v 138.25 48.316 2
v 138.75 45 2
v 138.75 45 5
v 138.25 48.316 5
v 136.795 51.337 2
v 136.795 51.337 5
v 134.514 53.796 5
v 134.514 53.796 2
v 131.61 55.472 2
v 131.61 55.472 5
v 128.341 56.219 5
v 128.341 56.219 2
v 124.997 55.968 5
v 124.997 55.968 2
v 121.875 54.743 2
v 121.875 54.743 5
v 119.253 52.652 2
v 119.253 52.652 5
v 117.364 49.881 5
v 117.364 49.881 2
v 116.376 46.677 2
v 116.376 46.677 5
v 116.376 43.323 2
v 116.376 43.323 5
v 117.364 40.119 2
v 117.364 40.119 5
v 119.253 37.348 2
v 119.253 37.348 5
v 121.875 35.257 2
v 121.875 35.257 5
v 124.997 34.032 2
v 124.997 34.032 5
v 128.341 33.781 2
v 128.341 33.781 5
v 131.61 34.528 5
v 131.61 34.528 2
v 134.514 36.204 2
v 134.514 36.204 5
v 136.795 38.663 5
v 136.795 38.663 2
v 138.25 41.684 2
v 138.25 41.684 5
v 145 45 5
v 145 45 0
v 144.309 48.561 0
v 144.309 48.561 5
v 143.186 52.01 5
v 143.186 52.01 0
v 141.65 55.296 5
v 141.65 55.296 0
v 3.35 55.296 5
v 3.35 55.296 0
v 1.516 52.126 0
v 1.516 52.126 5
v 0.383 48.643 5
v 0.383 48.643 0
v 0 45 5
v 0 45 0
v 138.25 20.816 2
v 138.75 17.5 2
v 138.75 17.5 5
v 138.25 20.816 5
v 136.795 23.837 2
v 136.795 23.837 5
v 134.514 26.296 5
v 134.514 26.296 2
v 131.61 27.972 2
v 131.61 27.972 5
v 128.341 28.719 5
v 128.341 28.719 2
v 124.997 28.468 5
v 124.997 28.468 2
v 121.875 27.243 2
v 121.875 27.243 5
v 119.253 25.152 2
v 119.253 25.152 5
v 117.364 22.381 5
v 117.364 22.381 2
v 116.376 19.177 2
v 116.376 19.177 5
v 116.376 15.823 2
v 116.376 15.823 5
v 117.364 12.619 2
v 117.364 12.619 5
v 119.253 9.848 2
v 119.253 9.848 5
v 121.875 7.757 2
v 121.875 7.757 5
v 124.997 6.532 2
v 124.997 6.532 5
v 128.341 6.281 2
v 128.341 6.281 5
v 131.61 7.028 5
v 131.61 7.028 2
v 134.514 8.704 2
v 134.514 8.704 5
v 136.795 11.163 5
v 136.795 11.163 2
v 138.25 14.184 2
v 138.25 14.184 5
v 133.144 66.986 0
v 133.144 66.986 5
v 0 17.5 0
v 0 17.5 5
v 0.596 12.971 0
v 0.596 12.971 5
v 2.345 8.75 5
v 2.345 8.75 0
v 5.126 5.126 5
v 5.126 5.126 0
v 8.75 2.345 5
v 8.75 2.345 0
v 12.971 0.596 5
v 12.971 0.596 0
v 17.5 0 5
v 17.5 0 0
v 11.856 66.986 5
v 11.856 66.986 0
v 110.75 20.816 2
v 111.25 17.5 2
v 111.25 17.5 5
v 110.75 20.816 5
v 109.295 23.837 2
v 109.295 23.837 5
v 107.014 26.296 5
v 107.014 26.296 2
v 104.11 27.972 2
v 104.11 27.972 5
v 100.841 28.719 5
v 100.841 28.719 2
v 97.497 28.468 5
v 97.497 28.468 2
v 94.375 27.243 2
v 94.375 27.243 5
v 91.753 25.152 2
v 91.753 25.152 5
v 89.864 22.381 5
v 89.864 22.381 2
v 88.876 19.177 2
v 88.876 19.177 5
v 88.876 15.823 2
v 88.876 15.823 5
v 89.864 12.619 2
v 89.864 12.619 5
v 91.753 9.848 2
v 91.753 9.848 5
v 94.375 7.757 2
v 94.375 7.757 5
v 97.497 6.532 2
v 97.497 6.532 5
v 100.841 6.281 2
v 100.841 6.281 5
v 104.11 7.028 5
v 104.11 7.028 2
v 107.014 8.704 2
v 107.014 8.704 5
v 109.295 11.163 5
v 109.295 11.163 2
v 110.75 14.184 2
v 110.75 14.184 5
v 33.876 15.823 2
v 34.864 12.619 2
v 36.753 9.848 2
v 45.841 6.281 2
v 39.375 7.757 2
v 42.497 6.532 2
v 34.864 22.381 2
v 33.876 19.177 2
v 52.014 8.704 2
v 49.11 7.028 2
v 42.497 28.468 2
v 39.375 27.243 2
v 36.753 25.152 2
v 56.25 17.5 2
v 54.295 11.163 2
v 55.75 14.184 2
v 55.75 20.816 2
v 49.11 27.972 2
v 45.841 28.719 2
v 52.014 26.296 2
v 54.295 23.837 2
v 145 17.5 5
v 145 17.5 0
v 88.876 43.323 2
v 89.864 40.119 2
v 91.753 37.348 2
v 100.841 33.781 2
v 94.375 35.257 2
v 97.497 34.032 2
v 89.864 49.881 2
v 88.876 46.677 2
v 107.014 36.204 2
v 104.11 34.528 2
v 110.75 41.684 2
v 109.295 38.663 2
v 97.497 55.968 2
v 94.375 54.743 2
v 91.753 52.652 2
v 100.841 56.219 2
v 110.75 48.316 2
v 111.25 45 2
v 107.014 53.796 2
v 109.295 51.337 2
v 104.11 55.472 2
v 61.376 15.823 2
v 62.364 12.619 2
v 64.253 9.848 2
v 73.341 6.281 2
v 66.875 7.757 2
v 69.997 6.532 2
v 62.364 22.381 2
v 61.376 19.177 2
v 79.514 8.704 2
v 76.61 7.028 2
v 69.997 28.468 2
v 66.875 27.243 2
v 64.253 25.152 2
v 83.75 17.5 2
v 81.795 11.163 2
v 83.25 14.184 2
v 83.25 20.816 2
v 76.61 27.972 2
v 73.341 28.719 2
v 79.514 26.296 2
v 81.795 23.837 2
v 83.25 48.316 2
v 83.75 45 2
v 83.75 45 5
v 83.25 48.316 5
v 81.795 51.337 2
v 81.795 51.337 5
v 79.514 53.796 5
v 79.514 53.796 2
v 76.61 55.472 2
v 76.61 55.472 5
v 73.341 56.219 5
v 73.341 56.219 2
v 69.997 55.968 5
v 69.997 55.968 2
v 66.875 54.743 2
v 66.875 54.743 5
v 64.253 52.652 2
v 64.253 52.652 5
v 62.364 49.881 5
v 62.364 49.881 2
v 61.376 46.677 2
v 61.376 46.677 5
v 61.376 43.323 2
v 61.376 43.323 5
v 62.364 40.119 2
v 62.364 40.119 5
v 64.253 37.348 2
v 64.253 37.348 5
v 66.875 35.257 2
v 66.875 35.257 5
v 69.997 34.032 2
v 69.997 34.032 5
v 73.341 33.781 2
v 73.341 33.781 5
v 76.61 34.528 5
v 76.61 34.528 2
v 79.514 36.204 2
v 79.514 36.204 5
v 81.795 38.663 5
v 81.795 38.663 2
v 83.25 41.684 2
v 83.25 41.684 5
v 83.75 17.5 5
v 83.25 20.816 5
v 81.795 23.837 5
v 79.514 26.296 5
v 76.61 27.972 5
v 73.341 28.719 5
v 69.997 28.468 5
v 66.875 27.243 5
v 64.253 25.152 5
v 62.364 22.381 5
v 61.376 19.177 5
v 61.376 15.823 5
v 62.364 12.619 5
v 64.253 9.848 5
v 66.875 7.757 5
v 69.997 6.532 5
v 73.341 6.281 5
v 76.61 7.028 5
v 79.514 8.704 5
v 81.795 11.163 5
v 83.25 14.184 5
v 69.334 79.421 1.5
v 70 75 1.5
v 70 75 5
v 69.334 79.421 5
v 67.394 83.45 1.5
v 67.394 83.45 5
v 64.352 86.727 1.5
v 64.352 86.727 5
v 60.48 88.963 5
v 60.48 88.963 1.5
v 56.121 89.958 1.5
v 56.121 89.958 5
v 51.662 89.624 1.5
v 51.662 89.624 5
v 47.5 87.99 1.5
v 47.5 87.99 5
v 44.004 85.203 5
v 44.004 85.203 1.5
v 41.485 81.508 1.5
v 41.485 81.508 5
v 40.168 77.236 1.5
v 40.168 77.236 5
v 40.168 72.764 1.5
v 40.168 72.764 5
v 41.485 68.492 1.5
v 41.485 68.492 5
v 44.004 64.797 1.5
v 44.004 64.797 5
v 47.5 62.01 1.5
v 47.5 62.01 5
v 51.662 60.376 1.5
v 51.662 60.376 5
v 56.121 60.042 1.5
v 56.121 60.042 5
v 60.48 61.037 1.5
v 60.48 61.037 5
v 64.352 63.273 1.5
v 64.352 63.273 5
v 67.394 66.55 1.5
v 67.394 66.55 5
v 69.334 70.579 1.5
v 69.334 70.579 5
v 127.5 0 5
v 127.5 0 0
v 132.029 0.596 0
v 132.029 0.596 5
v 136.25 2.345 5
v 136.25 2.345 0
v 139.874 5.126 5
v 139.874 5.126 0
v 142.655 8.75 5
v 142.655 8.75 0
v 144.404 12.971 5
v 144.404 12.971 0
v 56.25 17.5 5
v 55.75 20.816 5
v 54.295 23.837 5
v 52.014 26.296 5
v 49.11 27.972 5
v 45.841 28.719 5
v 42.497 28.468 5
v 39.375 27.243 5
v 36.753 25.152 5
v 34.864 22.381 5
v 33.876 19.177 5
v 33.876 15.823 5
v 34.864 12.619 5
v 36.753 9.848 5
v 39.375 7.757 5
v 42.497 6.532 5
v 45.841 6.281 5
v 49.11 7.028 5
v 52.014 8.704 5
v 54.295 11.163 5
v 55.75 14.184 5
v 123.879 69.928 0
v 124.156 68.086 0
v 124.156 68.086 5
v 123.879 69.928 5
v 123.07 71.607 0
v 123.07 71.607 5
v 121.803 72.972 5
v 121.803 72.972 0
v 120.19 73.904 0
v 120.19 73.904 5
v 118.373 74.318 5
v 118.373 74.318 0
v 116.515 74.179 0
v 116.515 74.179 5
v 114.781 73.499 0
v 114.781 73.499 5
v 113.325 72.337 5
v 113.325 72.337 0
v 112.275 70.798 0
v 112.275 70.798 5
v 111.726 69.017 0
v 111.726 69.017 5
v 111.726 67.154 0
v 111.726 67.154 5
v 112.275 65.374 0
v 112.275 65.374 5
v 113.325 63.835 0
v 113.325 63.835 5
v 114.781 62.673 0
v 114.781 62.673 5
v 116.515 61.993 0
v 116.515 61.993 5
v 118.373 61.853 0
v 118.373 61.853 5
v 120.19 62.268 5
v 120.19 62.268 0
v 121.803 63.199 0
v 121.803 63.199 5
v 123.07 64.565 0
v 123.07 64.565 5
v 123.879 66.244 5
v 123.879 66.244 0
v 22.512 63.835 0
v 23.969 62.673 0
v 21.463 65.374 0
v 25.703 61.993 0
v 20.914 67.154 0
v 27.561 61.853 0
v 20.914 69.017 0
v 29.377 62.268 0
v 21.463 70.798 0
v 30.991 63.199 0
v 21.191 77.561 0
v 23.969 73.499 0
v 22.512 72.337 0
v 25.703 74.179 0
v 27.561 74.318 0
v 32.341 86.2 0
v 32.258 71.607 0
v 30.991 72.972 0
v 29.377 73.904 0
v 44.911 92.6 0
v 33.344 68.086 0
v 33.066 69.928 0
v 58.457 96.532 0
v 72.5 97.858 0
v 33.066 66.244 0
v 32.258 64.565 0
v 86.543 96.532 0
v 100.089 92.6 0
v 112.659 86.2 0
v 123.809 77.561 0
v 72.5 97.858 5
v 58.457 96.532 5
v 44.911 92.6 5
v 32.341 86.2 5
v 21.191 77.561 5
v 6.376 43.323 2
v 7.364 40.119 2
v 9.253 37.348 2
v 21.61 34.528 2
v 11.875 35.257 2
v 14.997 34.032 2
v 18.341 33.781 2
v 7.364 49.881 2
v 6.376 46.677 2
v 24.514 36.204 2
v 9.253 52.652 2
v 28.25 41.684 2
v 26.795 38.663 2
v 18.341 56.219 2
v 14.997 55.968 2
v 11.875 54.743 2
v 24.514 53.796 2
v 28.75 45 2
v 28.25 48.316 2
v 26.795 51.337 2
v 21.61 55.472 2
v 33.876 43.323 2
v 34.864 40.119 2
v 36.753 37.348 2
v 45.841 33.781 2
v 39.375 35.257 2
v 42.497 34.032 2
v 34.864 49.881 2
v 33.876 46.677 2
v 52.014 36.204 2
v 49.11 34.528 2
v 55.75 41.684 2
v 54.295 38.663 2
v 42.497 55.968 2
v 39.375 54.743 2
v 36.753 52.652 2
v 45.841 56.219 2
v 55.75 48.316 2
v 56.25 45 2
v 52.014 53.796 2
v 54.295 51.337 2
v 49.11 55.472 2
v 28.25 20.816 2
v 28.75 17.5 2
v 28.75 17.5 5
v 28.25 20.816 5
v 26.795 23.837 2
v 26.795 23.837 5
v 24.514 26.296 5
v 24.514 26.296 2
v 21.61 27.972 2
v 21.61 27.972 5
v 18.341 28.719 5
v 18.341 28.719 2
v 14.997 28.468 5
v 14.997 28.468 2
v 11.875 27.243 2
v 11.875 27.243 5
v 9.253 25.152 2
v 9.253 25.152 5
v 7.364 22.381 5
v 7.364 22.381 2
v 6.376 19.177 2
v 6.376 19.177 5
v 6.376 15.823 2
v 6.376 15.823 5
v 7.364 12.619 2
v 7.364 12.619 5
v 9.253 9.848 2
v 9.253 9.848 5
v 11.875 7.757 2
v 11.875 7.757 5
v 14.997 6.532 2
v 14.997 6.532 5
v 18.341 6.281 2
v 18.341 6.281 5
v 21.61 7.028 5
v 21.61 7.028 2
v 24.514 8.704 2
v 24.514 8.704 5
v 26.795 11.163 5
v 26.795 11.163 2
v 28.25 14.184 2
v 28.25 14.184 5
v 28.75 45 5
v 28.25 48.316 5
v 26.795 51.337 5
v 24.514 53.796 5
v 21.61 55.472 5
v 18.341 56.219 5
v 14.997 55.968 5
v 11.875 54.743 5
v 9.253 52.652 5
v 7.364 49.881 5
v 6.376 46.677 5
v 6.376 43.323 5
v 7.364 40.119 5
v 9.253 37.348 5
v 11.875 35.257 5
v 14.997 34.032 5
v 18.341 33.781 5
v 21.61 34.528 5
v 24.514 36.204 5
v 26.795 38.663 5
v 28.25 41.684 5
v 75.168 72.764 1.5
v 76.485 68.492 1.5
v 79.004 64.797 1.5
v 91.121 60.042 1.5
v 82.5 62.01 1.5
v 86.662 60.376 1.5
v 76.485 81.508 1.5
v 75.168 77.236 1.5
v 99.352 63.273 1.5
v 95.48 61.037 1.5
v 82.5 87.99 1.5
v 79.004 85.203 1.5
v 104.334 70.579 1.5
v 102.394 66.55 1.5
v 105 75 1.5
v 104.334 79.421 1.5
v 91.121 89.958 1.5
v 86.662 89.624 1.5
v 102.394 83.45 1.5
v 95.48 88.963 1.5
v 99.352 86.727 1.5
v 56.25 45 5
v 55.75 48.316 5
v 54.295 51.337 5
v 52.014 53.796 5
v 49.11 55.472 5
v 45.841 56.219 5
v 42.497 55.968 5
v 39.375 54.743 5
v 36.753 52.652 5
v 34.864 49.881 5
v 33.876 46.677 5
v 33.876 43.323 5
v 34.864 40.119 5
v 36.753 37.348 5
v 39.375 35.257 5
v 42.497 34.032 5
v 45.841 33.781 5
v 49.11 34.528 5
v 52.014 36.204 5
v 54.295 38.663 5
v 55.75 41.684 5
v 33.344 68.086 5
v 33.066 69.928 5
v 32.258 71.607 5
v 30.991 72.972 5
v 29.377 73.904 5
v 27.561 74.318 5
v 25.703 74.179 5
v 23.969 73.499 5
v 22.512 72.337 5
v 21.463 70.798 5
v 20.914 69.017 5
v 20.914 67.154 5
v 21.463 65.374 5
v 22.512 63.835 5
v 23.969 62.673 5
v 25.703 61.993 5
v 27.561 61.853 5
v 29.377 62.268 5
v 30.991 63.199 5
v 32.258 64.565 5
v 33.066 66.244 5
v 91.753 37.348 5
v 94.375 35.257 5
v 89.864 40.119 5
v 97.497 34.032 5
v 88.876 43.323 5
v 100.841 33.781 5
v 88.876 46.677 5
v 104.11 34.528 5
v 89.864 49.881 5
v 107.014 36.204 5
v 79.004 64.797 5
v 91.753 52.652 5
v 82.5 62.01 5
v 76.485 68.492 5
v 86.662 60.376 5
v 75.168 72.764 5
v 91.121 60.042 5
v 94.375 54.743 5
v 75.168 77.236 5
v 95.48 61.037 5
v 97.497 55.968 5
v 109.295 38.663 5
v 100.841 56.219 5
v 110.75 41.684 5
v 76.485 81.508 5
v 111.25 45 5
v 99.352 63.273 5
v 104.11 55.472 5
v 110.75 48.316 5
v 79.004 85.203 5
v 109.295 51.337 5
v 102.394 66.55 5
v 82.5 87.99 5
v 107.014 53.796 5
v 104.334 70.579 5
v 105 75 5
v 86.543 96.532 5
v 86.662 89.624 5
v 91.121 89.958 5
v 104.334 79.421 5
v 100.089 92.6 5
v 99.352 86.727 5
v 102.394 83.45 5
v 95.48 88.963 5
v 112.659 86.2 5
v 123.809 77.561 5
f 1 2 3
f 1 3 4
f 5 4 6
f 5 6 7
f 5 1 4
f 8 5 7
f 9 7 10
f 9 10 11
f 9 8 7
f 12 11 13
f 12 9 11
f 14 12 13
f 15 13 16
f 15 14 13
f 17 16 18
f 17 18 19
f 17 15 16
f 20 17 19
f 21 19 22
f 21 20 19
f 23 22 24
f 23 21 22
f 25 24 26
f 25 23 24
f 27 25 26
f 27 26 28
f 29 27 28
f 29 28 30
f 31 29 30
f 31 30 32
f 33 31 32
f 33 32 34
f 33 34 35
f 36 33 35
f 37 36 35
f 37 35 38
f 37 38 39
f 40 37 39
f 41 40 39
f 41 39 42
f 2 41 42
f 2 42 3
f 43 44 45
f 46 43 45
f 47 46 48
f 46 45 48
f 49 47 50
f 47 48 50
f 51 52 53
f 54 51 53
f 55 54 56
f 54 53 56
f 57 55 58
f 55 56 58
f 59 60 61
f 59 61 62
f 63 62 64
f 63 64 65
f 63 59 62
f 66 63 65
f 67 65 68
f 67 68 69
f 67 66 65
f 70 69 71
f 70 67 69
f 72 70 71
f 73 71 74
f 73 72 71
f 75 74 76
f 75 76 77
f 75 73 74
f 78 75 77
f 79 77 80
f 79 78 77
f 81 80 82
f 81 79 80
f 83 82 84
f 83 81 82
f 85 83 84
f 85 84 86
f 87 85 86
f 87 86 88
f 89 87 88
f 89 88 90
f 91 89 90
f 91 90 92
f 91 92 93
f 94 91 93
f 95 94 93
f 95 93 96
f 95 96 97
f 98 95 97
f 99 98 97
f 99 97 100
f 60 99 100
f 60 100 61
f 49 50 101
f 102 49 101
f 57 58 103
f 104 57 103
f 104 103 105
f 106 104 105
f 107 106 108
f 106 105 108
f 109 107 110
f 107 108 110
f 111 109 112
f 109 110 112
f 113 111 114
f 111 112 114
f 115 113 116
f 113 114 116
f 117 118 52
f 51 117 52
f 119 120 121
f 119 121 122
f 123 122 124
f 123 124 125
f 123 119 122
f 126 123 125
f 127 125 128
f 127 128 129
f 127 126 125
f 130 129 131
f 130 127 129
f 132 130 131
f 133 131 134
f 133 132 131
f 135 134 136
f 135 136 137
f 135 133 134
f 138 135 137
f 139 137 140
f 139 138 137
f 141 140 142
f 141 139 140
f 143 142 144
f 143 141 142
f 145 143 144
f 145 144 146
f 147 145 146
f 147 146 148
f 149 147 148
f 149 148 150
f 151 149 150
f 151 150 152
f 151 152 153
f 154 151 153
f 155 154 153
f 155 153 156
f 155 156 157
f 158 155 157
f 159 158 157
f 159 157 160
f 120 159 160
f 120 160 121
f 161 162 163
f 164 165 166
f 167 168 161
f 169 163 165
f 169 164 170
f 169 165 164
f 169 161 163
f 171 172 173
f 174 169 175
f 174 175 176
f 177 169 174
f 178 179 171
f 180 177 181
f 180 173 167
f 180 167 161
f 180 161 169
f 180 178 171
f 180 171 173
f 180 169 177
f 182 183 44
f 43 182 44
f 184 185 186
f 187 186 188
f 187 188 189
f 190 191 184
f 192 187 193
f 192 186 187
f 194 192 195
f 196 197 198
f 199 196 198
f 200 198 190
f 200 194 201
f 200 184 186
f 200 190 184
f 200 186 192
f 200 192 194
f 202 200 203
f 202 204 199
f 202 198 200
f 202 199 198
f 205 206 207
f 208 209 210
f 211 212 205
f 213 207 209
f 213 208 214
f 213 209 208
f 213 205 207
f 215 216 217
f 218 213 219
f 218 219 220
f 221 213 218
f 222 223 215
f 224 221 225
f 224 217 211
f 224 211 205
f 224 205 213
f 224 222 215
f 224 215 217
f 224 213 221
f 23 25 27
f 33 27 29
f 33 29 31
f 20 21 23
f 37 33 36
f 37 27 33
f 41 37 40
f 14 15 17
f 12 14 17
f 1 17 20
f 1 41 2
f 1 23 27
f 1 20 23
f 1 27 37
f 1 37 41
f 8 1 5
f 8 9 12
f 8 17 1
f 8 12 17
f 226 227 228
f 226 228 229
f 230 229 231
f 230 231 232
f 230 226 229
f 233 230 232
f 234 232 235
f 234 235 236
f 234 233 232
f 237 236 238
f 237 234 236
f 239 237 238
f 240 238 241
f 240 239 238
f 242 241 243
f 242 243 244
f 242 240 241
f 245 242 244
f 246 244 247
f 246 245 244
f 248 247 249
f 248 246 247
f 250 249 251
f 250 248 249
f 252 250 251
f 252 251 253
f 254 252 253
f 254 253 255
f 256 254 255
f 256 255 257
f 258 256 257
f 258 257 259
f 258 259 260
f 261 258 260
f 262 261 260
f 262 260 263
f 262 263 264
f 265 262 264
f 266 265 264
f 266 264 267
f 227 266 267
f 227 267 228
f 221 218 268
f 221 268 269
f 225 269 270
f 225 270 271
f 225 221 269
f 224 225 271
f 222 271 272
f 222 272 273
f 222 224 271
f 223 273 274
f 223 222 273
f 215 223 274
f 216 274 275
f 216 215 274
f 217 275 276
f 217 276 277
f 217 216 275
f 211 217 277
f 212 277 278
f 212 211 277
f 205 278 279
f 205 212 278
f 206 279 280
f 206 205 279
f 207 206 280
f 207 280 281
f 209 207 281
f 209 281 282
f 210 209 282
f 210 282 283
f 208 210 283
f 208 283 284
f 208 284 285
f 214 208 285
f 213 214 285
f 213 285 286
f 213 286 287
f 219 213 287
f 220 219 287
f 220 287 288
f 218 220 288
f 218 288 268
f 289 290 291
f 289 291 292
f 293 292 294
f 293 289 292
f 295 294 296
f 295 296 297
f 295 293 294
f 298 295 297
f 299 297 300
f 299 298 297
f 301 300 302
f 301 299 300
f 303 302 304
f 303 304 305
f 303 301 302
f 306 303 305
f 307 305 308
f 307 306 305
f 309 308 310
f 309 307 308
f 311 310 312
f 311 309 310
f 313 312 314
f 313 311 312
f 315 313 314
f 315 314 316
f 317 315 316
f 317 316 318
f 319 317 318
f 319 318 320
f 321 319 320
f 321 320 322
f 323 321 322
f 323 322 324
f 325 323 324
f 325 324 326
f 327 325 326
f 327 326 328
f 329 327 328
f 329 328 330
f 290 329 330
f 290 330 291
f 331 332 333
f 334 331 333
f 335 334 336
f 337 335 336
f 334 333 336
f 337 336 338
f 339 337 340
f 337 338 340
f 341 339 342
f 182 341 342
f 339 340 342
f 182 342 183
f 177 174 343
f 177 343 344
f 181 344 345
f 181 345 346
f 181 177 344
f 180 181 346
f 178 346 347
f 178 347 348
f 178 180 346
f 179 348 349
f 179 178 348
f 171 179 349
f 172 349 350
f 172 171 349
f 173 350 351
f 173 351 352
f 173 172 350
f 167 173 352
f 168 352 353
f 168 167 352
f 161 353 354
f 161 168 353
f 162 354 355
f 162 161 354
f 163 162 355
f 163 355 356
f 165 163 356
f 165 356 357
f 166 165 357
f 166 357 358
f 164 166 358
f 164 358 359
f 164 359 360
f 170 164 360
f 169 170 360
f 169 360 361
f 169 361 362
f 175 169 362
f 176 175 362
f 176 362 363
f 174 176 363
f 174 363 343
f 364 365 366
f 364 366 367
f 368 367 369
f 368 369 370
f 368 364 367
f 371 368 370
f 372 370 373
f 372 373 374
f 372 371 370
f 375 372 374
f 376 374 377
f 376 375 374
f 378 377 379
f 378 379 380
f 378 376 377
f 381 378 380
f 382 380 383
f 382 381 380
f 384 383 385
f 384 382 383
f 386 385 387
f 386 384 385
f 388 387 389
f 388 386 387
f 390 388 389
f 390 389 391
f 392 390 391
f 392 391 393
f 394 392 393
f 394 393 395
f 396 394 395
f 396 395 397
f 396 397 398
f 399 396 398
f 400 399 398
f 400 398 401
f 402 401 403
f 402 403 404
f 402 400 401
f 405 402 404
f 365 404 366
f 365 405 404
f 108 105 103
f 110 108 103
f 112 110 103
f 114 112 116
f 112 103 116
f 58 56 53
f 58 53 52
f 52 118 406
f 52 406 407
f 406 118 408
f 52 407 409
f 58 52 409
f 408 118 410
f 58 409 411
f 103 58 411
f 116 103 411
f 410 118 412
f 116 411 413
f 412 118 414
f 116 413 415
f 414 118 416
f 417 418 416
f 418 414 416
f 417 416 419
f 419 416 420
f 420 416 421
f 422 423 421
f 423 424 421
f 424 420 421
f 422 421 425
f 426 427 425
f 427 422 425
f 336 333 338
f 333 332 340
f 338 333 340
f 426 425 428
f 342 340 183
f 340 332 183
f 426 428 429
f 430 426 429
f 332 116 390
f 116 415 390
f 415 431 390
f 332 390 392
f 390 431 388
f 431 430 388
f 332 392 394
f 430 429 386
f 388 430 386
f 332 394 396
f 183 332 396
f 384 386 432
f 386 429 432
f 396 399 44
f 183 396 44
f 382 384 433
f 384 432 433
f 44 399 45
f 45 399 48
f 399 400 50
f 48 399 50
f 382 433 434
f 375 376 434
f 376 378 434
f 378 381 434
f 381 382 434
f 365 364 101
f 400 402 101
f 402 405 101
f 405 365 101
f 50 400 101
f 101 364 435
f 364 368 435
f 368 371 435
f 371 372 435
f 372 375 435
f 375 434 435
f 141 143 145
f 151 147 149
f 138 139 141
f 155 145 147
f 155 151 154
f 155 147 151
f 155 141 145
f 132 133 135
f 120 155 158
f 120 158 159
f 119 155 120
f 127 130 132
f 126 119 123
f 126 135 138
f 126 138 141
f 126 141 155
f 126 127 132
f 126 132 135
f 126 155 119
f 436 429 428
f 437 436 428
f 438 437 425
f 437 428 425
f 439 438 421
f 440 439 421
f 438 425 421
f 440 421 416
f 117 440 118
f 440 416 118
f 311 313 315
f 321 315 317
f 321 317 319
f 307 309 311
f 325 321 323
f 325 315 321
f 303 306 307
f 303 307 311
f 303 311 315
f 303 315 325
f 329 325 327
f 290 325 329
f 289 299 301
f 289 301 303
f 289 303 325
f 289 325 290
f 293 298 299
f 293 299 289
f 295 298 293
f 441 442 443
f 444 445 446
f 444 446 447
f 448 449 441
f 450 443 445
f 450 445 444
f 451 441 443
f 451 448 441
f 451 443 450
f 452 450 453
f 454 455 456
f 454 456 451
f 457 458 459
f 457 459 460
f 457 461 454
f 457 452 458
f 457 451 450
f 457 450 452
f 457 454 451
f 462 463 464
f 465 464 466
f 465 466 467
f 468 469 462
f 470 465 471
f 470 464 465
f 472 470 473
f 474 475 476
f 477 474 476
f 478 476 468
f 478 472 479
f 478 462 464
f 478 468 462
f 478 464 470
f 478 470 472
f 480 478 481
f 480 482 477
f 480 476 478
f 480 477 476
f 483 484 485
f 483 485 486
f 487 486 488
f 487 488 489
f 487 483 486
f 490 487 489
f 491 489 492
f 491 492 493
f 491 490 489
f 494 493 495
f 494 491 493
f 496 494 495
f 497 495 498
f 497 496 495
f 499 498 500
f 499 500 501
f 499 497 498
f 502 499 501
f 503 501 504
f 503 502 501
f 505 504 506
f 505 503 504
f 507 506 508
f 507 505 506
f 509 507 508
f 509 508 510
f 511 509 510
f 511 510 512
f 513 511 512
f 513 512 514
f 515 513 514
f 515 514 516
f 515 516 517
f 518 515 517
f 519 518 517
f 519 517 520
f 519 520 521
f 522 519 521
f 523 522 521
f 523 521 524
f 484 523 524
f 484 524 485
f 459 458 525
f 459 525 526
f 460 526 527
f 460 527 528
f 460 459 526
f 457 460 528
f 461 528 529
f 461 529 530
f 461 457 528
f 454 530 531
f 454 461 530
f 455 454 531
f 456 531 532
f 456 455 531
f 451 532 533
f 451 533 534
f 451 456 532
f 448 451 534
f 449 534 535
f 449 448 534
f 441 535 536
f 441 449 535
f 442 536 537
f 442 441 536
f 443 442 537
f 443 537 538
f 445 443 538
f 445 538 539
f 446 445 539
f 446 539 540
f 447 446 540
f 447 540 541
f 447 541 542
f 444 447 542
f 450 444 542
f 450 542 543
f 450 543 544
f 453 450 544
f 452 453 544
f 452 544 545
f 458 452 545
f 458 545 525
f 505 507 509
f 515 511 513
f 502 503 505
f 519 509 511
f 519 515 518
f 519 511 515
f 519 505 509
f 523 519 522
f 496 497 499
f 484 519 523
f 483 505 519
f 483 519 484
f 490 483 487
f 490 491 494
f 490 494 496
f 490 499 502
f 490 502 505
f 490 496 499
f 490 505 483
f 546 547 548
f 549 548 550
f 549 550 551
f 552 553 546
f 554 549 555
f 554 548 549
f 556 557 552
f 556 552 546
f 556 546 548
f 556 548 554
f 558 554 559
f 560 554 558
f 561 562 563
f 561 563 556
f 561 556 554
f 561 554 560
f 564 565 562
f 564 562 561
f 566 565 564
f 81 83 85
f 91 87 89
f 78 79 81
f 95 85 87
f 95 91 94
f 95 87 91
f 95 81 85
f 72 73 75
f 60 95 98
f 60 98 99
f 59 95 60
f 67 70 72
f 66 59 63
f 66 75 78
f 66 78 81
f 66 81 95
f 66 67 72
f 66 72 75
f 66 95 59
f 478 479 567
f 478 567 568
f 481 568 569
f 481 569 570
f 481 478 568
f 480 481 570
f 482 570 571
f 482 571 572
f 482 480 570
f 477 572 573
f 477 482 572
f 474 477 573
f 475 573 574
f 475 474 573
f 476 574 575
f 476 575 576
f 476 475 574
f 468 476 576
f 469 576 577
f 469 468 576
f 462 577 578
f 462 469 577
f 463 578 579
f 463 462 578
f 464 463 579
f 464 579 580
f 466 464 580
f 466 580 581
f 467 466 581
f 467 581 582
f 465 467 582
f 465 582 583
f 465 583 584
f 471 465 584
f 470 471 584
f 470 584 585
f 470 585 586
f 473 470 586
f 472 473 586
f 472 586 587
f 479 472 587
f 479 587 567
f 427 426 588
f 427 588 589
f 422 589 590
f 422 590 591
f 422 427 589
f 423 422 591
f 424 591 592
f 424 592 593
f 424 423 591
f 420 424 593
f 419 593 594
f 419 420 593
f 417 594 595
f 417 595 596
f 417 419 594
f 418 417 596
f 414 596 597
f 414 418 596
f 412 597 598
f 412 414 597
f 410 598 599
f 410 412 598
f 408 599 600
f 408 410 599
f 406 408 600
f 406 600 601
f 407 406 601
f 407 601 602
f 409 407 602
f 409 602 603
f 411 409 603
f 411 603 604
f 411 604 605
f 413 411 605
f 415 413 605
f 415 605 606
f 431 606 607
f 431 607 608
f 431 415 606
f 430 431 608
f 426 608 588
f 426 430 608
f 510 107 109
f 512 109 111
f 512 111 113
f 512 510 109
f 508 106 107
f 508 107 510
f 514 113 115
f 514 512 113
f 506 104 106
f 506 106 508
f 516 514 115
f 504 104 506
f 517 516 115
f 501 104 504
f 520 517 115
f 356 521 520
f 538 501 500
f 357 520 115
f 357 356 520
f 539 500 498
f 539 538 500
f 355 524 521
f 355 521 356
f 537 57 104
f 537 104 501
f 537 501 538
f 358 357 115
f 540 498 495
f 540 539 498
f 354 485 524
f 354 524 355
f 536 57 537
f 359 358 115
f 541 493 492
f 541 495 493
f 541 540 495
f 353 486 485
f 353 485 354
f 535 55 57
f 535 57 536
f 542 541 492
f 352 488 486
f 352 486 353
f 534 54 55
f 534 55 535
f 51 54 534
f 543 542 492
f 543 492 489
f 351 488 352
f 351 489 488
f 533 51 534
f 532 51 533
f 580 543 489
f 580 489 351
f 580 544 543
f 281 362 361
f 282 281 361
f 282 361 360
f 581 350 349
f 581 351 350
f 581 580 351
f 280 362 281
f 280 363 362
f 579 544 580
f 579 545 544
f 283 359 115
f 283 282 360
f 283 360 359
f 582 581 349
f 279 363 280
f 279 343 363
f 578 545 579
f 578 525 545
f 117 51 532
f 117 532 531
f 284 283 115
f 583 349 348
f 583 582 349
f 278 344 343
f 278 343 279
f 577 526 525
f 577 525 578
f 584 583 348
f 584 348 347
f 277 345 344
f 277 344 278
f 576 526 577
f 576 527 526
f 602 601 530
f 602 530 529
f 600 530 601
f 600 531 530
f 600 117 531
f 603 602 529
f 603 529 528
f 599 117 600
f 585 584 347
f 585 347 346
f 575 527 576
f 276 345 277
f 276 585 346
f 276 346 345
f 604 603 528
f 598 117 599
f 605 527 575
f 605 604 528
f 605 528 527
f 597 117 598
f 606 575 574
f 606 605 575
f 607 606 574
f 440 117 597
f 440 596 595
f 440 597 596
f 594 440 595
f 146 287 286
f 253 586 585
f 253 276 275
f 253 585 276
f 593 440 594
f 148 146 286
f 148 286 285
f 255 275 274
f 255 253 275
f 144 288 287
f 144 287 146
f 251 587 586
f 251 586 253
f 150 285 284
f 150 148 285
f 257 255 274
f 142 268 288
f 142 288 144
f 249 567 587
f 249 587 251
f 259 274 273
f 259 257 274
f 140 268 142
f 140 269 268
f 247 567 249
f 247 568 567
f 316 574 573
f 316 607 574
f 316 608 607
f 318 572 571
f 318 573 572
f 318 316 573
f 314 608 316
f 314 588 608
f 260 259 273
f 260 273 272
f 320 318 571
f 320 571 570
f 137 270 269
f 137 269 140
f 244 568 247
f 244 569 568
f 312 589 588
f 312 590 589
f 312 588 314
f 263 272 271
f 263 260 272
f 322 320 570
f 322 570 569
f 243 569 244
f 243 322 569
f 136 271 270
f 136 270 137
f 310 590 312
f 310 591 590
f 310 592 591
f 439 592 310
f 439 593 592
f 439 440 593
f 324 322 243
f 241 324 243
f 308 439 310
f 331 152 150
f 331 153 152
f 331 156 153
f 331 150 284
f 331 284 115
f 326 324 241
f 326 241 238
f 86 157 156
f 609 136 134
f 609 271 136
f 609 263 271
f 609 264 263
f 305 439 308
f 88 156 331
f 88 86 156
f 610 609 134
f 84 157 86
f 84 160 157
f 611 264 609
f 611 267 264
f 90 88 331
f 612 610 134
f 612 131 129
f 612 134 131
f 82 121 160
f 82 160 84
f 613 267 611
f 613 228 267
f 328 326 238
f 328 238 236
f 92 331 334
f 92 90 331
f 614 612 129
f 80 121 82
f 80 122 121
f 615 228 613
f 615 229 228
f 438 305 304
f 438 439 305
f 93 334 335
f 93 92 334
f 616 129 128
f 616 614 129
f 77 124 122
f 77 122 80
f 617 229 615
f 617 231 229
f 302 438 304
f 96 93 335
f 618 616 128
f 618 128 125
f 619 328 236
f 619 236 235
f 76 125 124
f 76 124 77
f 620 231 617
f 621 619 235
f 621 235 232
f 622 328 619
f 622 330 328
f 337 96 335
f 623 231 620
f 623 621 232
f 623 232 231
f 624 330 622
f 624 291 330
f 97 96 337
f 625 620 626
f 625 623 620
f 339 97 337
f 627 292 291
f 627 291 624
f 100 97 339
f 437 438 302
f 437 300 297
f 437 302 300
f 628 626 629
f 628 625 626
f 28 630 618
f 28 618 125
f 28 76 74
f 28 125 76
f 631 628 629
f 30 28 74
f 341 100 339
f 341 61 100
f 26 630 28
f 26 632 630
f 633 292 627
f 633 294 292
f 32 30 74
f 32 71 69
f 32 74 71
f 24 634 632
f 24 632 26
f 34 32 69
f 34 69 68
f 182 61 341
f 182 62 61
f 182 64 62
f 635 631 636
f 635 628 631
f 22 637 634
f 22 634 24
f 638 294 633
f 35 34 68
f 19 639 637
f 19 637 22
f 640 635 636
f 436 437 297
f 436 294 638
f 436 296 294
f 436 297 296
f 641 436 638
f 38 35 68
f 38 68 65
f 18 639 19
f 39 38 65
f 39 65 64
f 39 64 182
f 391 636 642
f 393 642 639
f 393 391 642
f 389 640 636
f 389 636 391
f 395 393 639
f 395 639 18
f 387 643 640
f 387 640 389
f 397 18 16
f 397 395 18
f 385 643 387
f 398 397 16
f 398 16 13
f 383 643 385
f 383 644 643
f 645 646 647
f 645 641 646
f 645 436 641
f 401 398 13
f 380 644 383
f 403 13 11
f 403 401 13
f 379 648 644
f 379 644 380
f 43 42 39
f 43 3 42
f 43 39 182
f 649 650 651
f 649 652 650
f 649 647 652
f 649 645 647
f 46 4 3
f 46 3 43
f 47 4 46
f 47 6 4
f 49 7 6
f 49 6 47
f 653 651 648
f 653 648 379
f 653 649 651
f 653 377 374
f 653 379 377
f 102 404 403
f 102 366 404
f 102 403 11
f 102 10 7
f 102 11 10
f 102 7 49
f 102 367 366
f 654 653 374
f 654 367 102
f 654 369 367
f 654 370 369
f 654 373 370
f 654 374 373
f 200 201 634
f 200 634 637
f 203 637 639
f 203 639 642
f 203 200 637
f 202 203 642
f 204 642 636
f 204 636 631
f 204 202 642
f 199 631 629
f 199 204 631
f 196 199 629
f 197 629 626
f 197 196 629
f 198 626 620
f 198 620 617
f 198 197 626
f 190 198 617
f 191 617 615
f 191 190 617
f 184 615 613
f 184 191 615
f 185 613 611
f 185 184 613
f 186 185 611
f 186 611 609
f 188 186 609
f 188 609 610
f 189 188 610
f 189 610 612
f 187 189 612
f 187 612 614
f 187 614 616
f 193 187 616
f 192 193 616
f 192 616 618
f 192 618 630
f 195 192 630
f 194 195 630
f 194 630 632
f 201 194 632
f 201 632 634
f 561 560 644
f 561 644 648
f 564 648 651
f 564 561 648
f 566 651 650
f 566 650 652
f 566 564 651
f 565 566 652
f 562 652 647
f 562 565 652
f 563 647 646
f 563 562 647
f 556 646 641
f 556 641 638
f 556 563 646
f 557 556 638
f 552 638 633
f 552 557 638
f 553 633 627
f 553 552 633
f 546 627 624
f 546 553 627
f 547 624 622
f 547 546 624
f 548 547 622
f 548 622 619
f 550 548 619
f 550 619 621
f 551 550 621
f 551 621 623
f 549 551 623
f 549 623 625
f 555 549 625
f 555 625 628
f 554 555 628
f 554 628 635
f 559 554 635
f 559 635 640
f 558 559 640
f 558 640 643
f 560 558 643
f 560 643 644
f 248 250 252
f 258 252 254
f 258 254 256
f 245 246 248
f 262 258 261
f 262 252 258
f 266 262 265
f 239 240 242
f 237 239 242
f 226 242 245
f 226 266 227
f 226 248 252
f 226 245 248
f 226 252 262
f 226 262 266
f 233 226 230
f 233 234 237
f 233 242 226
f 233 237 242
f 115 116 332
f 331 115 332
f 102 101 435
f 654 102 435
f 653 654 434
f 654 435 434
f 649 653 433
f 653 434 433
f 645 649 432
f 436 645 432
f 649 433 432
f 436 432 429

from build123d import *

# Parameters (mm, degrees)
F0_R     = 11.25
F0_R_2   = 6.25
F0_R_3   = 15
F1_DEPTH = 5
F2_DEPTH = 1.5
F3_DEPTH = 2


with BuildPart() as f1:
    # F0 (on Top) → F1 (new body)
    with BuildSketch(Plane.XY):
        with BuildLine():
            ThreePointArc((3.34966, 55.296498), (0.858471, 50.413827), (0, 45))
            Line((0, 45), (0, 17.5))
            ThreePointArc((0, 17.5), (5.125631, 5.125631), (17.5, 0))
            Line((17.5, 0), (127.5, 0))
            ThreePointArc((127.5, 0), (139.874369, 5.125631), (145, 17.5))
            Line((145, 17.5), (145, 45))
            ThreePointArc((145, 45), (143.800402, 50.302852), (141.65034, 55.296498))
            Line((141.65034, 55.296498), (133.144315, 66.986215))
            ThreePointArc((133.144315, 66.986215), (106.525074, 89.696187), (72.5, 97.858366))
            ThreePointArc((72.5, 97.858366), (38.474926, 89.696187), (11.855685, 66.986215))
            Line((11.855685, 66.986215), (3.34966, 55.296498))
        make_face()
        with Locations((17.5, 17.5)):
            Circle(F0_R, mode=Mode.SUBTRACT)
        with Locations((45, 17.5)):
            Circle(F0_R, mode=Mode.SUBTRACT)
        with Locations((17.5, 45)):
            Circle(F0_R, mode=Mode.SUBTRACT)
        with Locations((45, 45)):
            Circle(F0_R, mode=Mode.SUBTRACT)
        with Locations((72.5, 17.5)):
            Circle(F0_R, mode=Mode.SUBTRACT)
        with Locations((100, 17.5)):
            Circle(F0_R, mode=Mode.SUBTRACT)
        with Locations((127.5, 17.5)):
            Circle(F0_R, mode=Mode.SUBTRACT)
        with Locations((72.5, 45)):
            Circle(F0_R, mode=Mode.SUBTRACT)
        with Locations((100, 45)):
            Circle(F0_R, mode=Mode.SUBTRACT)
        with Locations((127.5, 45)):
            Circle(F0_R, mode=Mode.SUBTRACT)
        with Locations((27.093764, 68.08592)):
            Circle(F0_R_2, mode=Mode.SUBTRACT)
        with Locations((55, 75)):
            Circle(F0_R_3, mode=Mode.SUBTRACT)
        with Locations((117.906236, 68.08592)):
            Circle(F0_R_2, mode=Mode.SUBTRACT)
        with Locations((90, 75)):
            Circle(F0_R_3, mode=Mode.SUBTRACT)
    extrude(amount=F1_DEPTH)

    # F0 (on Top) → F2 (join)
    with BuildSketch(Plane.XY):
        with Locations((55, 75)):
            Circle(F0_R_3)
        with Locations((90, 75)):
            Circle(F0_R_3)
    extrude(amount=F2_DEPTH)

    # F0 (on Top) → F3 (join)
    with BuildSketch(Plane.XY):
        with Locations((17.5, 45)):
            Circle(F0_R)
        with Locations((17.5, 17.5)):
            Circle(F0_R)
        with Locations((45, 45)):
            Circle(F0_R)
        with Locations((45, 17.5)):
            Circle(F0_R)
        with Locations((72.5, 45)):
            Circle(F0_R)
        with Locations((72.5, 17.5)):
            Circle(F0_R)
        with Locations((100, 45)):
            Circle(F0_R)
        with Locations((100, 17.5)):
            Circle(F0_R)
        with Locations((127.5, 45)):
            Circle(F0_R)
        with Locations((127.5, 17.5)):
            Circle(F0_R)
    extrude(amount=F3_DEPTH)


solid = f1.part
